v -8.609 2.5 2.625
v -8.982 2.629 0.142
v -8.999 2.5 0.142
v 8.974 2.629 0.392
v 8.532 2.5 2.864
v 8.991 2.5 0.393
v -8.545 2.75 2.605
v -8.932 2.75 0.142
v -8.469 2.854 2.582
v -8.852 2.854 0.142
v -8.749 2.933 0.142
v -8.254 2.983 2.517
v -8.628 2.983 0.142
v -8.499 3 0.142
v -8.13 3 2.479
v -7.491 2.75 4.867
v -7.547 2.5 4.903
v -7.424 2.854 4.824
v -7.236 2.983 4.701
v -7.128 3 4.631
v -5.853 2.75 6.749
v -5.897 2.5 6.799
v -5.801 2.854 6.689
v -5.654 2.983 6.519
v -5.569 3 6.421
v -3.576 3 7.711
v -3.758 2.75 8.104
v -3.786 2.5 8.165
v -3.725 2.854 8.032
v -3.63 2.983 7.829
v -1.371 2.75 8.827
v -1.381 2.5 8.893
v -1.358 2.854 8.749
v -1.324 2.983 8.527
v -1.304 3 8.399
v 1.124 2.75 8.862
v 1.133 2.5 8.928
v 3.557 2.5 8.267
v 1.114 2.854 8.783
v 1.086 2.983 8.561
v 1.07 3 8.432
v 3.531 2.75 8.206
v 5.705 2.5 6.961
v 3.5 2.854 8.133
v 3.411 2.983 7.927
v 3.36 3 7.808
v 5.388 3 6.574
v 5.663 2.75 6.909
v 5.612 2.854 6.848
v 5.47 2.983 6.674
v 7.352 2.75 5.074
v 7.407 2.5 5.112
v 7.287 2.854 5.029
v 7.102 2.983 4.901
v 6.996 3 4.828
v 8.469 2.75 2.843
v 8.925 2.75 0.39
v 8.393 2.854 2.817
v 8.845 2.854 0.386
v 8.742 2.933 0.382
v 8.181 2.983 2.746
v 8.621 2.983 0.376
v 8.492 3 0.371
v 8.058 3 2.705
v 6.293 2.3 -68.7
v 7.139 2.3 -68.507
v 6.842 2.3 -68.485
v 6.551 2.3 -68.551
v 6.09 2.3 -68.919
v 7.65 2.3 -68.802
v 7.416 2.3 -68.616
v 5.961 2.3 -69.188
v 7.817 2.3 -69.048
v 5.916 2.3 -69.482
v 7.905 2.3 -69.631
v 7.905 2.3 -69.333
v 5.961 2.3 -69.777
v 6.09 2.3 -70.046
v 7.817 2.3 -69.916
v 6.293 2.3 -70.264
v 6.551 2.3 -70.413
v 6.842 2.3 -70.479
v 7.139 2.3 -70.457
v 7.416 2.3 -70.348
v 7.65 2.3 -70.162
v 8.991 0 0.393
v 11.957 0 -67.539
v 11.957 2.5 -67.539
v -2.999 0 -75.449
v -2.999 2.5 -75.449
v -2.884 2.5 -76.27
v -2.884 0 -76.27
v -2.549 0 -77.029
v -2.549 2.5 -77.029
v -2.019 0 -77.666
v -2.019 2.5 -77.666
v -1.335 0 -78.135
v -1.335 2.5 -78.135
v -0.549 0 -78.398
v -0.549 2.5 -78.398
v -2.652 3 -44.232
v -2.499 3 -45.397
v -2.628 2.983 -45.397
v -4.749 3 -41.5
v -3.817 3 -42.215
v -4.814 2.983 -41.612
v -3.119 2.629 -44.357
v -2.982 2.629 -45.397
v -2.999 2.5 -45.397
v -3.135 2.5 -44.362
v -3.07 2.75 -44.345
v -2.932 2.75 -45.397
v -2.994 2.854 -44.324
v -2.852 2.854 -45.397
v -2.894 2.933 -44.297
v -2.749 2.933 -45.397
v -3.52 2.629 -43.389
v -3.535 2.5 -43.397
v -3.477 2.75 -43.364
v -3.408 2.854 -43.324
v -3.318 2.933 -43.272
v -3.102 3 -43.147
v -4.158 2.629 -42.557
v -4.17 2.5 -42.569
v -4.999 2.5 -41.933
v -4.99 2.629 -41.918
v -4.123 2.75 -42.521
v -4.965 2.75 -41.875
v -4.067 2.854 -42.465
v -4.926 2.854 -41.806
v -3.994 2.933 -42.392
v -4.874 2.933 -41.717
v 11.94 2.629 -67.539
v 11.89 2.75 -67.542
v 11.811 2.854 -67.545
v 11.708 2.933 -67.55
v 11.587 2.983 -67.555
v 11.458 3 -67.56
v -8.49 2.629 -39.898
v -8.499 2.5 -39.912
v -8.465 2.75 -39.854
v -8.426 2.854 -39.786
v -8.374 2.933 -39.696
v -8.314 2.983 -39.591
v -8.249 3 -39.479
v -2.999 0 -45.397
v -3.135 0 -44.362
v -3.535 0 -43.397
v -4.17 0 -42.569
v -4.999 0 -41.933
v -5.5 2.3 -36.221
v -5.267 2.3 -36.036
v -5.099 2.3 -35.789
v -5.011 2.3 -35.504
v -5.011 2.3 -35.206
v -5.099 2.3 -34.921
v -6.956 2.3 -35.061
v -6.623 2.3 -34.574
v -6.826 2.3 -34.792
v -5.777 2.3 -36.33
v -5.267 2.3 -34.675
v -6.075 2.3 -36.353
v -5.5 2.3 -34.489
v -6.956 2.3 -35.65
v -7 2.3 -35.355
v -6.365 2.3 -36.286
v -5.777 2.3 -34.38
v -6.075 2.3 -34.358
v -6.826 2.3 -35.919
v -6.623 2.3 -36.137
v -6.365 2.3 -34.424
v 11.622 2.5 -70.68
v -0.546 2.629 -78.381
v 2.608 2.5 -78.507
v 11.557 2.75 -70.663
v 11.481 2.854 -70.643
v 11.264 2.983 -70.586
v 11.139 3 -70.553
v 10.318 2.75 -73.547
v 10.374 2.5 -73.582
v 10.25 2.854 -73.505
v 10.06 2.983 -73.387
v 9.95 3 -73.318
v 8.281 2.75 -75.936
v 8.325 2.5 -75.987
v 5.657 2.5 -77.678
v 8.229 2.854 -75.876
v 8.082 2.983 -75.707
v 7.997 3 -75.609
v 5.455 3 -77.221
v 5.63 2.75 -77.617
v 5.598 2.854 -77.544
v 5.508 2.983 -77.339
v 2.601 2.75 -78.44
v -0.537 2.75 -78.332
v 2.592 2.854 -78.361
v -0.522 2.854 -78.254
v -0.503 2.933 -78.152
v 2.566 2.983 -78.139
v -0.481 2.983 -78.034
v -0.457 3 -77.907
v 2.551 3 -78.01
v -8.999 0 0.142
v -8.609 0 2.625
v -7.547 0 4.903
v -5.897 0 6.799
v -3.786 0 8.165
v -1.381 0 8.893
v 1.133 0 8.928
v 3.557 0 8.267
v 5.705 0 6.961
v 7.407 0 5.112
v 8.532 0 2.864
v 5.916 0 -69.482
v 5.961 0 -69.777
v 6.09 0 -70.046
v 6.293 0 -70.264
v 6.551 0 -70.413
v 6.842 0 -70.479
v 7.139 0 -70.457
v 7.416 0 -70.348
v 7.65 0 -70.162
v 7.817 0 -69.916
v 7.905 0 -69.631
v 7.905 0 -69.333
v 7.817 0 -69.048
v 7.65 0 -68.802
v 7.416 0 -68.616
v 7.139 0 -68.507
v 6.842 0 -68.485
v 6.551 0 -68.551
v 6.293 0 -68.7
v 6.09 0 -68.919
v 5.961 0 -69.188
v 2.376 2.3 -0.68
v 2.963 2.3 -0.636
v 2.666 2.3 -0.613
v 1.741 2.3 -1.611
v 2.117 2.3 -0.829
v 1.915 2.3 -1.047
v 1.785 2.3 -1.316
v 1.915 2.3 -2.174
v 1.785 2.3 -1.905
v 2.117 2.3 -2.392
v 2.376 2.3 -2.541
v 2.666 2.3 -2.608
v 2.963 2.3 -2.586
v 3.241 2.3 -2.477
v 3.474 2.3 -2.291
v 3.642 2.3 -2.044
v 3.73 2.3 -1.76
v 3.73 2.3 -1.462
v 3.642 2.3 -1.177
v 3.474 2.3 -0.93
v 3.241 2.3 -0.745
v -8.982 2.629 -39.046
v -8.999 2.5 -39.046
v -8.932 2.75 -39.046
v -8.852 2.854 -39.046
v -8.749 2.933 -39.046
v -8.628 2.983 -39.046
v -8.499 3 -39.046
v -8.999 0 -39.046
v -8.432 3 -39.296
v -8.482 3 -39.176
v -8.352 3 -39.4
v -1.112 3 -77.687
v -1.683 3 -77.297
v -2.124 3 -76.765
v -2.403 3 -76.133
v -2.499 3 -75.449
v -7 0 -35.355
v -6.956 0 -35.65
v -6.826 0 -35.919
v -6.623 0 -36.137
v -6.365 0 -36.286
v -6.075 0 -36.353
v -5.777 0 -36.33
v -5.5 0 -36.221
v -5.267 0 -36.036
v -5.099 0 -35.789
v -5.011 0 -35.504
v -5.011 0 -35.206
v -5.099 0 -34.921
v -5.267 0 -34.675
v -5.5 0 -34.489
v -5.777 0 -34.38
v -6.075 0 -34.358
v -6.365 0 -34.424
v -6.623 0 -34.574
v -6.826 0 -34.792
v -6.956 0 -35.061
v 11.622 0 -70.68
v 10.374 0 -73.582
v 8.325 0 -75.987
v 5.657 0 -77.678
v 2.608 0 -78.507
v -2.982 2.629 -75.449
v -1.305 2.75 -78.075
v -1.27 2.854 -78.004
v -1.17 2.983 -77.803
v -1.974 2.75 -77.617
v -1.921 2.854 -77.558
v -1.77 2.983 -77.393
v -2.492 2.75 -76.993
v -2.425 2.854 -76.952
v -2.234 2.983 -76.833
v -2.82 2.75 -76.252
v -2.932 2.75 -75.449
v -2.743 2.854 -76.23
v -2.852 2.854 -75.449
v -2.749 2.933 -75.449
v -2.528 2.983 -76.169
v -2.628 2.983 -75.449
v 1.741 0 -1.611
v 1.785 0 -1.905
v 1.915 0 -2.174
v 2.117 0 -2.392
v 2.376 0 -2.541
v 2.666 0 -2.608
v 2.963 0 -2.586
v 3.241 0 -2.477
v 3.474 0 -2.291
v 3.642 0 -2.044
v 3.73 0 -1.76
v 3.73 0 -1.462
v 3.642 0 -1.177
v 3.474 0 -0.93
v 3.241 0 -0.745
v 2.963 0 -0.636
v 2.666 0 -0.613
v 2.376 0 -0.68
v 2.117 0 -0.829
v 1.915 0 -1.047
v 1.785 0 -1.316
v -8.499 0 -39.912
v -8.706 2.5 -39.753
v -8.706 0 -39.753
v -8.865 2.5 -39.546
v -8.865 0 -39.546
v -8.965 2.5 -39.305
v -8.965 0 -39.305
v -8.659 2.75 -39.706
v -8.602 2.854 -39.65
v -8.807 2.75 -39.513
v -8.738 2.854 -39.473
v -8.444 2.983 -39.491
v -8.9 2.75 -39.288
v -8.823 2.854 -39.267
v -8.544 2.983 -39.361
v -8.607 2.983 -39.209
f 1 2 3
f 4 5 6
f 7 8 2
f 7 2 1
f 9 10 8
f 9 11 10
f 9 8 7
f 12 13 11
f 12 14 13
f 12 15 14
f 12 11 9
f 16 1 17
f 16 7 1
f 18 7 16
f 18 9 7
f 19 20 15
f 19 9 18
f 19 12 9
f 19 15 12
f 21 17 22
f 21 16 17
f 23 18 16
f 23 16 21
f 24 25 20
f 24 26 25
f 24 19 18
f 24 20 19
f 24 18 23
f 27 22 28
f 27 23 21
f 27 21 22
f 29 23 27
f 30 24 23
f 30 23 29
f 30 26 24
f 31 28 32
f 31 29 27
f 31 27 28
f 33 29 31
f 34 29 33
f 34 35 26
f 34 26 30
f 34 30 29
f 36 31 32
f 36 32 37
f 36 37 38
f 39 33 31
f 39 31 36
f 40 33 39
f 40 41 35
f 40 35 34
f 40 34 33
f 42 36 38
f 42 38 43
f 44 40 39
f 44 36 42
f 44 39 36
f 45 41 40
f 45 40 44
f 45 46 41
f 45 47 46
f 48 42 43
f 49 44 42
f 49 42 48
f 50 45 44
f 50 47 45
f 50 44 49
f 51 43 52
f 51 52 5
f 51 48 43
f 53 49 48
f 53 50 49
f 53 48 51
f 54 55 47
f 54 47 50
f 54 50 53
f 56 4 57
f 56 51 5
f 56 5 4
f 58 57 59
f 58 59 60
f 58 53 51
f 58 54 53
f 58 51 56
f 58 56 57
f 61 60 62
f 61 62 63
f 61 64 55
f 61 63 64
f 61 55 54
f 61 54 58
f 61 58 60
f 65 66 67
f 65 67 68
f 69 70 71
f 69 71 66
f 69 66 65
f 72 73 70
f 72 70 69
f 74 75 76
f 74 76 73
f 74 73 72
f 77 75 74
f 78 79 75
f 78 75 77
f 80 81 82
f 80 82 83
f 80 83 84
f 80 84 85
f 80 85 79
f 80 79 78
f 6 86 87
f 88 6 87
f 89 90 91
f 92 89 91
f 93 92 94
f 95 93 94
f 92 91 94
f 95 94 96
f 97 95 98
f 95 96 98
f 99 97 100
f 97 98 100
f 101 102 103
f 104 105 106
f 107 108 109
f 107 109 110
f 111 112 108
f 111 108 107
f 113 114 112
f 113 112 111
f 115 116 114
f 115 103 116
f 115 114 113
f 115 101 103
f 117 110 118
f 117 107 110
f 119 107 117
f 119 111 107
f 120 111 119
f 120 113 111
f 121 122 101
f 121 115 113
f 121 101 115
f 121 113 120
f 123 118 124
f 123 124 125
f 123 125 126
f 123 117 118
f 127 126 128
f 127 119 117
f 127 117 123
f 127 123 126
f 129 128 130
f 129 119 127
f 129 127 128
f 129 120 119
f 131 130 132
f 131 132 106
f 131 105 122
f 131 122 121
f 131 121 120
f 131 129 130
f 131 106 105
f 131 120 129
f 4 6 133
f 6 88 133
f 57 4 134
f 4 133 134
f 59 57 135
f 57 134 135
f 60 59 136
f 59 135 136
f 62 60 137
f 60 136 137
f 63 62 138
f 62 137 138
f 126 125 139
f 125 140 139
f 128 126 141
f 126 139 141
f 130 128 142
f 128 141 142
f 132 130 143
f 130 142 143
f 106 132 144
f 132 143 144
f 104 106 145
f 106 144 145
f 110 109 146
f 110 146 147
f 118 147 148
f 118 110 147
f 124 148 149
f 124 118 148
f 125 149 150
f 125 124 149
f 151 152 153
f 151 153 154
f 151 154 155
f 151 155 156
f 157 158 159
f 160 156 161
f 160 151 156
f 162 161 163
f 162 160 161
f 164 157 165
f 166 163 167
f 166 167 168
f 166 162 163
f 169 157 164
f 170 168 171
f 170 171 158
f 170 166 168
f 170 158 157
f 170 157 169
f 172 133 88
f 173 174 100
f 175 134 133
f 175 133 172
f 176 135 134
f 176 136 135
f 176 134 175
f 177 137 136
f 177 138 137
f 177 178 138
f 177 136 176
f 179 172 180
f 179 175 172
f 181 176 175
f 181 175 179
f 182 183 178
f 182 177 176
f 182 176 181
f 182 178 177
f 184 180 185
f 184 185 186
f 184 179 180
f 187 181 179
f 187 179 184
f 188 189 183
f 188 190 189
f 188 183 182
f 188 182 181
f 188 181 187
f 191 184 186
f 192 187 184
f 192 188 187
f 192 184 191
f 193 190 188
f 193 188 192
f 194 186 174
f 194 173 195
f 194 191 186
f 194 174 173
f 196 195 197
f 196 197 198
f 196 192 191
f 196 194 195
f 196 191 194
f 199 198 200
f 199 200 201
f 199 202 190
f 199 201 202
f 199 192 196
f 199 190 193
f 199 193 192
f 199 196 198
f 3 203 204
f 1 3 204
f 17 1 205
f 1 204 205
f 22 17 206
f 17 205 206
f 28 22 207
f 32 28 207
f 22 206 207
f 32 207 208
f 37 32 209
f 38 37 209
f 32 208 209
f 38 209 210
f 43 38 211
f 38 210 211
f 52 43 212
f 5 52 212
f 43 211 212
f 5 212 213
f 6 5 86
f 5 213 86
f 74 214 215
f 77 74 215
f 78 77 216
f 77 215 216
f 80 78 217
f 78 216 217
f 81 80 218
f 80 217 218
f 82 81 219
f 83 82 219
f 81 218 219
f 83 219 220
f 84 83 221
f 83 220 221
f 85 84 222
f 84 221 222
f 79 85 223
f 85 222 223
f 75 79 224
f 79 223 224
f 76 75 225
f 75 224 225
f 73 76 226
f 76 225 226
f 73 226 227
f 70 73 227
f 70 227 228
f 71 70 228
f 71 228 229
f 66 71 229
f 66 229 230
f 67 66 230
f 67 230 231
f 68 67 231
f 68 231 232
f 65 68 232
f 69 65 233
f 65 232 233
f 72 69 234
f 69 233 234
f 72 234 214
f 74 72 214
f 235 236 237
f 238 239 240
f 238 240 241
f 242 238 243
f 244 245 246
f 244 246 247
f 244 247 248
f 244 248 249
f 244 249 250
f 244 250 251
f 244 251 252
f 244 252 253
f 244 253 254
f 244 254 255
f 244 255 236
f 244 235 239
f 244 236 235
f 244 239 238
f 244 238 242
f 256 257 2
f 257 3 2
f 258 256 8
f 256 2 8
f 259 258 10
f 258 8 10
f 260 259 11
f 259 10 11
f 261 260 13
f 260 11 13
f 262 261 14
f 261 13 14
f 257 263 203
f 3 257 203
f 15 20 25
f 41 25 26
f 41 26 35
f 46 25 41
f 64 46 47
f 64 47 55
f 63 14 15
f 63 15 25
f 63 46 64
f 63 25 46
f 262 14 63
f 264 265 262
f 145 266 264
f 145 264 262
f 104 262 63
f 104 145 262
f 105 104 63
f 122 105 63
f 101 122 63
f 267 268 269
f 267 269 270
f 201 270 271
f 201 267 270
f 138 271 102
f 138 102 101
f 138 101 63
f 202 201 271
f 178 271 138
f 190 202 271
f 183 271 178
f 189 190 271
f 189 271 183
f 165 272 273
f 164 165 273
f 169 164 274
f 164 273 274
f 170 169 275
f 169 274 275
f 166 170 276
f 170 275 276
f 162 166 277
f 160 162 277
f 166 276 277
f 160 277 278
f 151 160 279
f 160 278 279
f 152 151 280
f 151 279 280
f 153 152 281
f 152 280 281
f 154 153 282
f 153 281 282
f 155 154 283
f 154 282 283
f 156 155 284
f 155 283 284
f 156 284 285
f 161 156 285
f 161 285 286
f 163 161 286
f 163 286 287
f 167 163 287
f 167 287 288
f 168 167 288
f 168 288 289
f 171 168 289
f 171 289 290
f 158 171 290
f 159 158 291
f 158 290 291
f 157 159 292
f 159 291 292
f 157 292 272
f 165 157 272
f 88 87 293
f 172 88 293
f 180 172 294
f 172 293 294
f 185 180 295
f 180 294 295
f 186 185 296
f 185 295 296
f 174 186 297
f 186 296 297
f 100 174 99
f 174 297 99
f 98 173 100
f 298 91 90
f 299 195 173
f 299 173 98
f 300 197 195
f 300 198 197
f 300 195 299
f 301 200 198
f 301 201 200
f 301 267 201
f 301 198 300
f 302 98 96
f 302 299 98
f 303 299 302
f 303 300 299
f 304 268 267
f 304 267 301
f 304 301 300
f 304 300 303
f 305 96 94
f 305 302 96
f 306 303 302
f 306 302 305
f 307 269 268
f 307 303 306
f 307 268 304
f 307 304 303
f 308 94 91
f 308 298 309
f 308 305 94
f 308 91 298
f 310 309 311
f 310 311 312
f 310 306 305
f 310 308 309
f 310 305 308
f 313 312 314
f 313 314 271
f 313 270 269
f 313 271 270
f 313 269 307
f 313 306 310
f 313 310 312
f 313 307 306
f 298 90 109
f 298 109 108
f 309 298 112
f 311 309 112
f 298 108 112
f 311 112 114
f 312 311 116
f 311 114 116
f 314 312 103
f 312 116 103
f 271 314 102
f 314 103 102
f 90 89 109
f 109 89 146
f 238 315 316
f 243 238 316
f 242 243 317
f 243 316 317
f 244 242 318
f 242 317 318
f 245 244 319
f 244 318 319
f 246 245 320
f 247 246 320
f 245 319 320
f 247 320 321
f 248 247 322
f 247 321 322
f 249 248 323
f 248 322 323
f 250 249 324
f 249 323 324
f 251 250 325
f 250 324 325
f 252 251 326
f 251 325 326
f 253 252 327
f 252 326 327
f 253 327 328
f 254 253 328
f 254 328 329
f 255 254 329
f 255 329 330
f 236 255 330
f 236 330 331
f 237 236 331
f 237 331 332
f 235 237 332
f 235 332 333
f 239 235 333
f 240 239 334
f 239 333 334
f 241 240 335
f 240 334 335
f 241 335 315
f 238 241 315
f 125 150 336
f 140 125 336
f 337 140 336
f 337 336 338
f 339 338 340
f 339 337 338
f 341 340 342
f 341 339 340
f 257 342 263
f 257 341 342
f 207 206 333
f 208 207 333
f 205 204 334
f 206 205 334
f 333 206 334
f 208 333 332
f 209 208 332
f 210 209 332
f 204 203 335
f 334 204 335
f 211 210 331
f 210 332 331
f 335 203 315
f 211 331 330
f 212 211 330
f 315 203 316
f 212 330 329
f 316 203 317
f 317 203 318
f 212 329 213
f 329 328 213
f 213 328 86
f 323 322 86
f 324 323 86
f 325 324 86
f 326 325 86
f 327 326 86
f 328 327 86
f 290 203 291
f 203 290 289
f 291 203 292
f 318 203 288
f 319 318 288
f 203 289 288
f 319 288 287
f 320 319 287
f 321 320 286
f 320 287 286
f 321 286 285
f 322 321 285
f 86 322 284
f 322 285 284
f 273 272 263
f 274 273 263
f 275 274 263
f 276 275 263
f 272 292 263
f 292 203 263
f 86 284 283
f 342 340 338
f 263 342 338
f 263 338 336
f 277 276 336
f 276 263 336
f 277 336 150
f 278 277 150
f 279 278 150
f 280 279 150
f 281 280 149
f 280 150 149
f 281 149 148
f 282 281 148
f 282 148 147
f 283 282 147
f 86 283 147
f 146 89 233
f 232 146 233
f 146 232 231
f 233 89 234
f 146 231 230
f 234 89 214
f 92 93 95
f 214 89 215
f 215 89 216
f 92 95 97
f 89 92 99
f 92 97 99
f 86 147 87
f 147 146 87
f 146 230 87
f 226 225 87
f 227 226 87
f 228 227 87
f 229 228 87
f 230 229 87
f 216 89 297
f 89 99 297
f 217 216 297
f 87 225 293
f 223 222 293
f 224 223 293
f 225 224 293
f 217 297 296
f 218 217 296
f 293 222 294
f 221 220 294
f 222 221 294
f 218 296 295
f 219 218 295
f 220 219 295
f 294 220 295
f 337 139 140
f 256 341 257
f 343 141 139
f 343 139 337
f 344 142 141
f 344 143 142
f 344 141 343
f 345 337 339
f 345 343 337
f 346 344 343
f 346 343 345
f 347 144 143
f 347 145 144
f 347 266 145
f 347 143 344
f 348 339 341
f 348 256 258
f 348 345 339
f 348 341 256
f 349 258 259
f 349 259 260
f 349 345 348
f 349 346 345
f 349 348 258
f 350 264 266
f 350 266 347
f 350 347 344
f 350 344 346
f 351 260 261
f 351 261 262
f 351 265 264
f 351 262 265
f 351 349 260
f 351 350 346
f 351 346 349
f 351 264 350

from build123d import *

# Parameters (mm, degrees)
BOSS_EXTRUDE1_DEPTH = 3
FILLET1_R           = 4
FILLET2_R           = 3
FILLET3_R           = 1
FILLET4_R           = 0.5
SKETCH2_R           = 1
CUT_EXTRUDE1_DEPTH  = 2.3


with BuildPart() as part:
    # Sketch1 → Boss-Extrude1 (new body)
    with BuildSketch(Plane(origin=(0, 0, 0), x_dir=(1, 0, 0), z_dir=(0, 1, 0))):
        with BuildLine():
            Line((8.991433994, -0.392574486), (11.957374237, 67.538625463))
            ThreePointArc((11.957374237, 67.538625463), (7.303664413, 76.769797523), (-2.998880838, 77.623679297))
            Line((-2.998880838, 77.623679297), (-2.998880838, 43.087780912))
            Line((-2.998880838, 43.087780912), (-8.998880838, 39.623679297))
            Line((-8.998880838, 39.623679297), (-8.998880838, -0.141928385))
            ThreePointArc((-8.998880838, -0.141928385), (-0.125378351, -8.999126639), (8.991433994, -0.392574486))
        make_face()
    extrude(amount=BOSS_EXTRUDE1_DEPTH)

    # Fillet1
    fillet1_edges = [part.edges().sort_by_distance(p)[0] for p in [
        (-2.998880838, 1.5, -43.087780912),
    ]]
    fillet(fillet1_edges, radius=FILLET1_R)

    # Fillet2
    fillet2_edges = [part.edges().sort_by_distance(p)[0] for p in [
        (-2.998880838, 1.5, -77.623679297),
    ]]
    fillet(fillet2_edges, radius=FILLET2_R)

    # Fillet3
    fillet3_edges = [part.edges().sort_by_distance(p)[0] for p in [
        (-8.998880838, 1.5, -39.623679297),
    ]]
    fillet(fillet3_edges, radius=FILLET3_R)

    # Fillet4
    fillet4_edges = [part.edges().sort_by_distance(p)[0] for p in [
        (10.474404116, 3, -33.573025488),
        (-0.125378351, 3, 8.999126639),
        (-8.998880838, 3, -19.452200321),
        (-2.998880838, 3, -60.423029196),
        (-3.534779223, 3, -43.397181989),
        (8.325091375, 3, -75.986589378),
        (-2.306460594, 3, -77.365925089),
        (-6.748880838, 3, -40.922717403),
        (-8.864906242, 3, -39.546329028),
    ]]
    fillet(fillet4_edges, radius=FILLET4_R)

    # Sketch2 → Cut-Extrude1 (cut)
    with BuildSketch(Plane(origin=(0, 0, 0), x_dir=(-1, 0, 0), z_dir=(0, -1, 0))):
        with Locations((-6.916463595, 69.482266802)):
            Circle(SKETCH2_R)
        with Locations((-2.740849282, 1.610591965)):
            Circle(SKETCH2_R)
        with Locations((6, 35.355339106)):
            Circle(SKETCH2_R)
    extrude(amount=-CUT_EXTRUDE1_DEPTH, mode=Mode.SUBTRACT)


solid = part.part
